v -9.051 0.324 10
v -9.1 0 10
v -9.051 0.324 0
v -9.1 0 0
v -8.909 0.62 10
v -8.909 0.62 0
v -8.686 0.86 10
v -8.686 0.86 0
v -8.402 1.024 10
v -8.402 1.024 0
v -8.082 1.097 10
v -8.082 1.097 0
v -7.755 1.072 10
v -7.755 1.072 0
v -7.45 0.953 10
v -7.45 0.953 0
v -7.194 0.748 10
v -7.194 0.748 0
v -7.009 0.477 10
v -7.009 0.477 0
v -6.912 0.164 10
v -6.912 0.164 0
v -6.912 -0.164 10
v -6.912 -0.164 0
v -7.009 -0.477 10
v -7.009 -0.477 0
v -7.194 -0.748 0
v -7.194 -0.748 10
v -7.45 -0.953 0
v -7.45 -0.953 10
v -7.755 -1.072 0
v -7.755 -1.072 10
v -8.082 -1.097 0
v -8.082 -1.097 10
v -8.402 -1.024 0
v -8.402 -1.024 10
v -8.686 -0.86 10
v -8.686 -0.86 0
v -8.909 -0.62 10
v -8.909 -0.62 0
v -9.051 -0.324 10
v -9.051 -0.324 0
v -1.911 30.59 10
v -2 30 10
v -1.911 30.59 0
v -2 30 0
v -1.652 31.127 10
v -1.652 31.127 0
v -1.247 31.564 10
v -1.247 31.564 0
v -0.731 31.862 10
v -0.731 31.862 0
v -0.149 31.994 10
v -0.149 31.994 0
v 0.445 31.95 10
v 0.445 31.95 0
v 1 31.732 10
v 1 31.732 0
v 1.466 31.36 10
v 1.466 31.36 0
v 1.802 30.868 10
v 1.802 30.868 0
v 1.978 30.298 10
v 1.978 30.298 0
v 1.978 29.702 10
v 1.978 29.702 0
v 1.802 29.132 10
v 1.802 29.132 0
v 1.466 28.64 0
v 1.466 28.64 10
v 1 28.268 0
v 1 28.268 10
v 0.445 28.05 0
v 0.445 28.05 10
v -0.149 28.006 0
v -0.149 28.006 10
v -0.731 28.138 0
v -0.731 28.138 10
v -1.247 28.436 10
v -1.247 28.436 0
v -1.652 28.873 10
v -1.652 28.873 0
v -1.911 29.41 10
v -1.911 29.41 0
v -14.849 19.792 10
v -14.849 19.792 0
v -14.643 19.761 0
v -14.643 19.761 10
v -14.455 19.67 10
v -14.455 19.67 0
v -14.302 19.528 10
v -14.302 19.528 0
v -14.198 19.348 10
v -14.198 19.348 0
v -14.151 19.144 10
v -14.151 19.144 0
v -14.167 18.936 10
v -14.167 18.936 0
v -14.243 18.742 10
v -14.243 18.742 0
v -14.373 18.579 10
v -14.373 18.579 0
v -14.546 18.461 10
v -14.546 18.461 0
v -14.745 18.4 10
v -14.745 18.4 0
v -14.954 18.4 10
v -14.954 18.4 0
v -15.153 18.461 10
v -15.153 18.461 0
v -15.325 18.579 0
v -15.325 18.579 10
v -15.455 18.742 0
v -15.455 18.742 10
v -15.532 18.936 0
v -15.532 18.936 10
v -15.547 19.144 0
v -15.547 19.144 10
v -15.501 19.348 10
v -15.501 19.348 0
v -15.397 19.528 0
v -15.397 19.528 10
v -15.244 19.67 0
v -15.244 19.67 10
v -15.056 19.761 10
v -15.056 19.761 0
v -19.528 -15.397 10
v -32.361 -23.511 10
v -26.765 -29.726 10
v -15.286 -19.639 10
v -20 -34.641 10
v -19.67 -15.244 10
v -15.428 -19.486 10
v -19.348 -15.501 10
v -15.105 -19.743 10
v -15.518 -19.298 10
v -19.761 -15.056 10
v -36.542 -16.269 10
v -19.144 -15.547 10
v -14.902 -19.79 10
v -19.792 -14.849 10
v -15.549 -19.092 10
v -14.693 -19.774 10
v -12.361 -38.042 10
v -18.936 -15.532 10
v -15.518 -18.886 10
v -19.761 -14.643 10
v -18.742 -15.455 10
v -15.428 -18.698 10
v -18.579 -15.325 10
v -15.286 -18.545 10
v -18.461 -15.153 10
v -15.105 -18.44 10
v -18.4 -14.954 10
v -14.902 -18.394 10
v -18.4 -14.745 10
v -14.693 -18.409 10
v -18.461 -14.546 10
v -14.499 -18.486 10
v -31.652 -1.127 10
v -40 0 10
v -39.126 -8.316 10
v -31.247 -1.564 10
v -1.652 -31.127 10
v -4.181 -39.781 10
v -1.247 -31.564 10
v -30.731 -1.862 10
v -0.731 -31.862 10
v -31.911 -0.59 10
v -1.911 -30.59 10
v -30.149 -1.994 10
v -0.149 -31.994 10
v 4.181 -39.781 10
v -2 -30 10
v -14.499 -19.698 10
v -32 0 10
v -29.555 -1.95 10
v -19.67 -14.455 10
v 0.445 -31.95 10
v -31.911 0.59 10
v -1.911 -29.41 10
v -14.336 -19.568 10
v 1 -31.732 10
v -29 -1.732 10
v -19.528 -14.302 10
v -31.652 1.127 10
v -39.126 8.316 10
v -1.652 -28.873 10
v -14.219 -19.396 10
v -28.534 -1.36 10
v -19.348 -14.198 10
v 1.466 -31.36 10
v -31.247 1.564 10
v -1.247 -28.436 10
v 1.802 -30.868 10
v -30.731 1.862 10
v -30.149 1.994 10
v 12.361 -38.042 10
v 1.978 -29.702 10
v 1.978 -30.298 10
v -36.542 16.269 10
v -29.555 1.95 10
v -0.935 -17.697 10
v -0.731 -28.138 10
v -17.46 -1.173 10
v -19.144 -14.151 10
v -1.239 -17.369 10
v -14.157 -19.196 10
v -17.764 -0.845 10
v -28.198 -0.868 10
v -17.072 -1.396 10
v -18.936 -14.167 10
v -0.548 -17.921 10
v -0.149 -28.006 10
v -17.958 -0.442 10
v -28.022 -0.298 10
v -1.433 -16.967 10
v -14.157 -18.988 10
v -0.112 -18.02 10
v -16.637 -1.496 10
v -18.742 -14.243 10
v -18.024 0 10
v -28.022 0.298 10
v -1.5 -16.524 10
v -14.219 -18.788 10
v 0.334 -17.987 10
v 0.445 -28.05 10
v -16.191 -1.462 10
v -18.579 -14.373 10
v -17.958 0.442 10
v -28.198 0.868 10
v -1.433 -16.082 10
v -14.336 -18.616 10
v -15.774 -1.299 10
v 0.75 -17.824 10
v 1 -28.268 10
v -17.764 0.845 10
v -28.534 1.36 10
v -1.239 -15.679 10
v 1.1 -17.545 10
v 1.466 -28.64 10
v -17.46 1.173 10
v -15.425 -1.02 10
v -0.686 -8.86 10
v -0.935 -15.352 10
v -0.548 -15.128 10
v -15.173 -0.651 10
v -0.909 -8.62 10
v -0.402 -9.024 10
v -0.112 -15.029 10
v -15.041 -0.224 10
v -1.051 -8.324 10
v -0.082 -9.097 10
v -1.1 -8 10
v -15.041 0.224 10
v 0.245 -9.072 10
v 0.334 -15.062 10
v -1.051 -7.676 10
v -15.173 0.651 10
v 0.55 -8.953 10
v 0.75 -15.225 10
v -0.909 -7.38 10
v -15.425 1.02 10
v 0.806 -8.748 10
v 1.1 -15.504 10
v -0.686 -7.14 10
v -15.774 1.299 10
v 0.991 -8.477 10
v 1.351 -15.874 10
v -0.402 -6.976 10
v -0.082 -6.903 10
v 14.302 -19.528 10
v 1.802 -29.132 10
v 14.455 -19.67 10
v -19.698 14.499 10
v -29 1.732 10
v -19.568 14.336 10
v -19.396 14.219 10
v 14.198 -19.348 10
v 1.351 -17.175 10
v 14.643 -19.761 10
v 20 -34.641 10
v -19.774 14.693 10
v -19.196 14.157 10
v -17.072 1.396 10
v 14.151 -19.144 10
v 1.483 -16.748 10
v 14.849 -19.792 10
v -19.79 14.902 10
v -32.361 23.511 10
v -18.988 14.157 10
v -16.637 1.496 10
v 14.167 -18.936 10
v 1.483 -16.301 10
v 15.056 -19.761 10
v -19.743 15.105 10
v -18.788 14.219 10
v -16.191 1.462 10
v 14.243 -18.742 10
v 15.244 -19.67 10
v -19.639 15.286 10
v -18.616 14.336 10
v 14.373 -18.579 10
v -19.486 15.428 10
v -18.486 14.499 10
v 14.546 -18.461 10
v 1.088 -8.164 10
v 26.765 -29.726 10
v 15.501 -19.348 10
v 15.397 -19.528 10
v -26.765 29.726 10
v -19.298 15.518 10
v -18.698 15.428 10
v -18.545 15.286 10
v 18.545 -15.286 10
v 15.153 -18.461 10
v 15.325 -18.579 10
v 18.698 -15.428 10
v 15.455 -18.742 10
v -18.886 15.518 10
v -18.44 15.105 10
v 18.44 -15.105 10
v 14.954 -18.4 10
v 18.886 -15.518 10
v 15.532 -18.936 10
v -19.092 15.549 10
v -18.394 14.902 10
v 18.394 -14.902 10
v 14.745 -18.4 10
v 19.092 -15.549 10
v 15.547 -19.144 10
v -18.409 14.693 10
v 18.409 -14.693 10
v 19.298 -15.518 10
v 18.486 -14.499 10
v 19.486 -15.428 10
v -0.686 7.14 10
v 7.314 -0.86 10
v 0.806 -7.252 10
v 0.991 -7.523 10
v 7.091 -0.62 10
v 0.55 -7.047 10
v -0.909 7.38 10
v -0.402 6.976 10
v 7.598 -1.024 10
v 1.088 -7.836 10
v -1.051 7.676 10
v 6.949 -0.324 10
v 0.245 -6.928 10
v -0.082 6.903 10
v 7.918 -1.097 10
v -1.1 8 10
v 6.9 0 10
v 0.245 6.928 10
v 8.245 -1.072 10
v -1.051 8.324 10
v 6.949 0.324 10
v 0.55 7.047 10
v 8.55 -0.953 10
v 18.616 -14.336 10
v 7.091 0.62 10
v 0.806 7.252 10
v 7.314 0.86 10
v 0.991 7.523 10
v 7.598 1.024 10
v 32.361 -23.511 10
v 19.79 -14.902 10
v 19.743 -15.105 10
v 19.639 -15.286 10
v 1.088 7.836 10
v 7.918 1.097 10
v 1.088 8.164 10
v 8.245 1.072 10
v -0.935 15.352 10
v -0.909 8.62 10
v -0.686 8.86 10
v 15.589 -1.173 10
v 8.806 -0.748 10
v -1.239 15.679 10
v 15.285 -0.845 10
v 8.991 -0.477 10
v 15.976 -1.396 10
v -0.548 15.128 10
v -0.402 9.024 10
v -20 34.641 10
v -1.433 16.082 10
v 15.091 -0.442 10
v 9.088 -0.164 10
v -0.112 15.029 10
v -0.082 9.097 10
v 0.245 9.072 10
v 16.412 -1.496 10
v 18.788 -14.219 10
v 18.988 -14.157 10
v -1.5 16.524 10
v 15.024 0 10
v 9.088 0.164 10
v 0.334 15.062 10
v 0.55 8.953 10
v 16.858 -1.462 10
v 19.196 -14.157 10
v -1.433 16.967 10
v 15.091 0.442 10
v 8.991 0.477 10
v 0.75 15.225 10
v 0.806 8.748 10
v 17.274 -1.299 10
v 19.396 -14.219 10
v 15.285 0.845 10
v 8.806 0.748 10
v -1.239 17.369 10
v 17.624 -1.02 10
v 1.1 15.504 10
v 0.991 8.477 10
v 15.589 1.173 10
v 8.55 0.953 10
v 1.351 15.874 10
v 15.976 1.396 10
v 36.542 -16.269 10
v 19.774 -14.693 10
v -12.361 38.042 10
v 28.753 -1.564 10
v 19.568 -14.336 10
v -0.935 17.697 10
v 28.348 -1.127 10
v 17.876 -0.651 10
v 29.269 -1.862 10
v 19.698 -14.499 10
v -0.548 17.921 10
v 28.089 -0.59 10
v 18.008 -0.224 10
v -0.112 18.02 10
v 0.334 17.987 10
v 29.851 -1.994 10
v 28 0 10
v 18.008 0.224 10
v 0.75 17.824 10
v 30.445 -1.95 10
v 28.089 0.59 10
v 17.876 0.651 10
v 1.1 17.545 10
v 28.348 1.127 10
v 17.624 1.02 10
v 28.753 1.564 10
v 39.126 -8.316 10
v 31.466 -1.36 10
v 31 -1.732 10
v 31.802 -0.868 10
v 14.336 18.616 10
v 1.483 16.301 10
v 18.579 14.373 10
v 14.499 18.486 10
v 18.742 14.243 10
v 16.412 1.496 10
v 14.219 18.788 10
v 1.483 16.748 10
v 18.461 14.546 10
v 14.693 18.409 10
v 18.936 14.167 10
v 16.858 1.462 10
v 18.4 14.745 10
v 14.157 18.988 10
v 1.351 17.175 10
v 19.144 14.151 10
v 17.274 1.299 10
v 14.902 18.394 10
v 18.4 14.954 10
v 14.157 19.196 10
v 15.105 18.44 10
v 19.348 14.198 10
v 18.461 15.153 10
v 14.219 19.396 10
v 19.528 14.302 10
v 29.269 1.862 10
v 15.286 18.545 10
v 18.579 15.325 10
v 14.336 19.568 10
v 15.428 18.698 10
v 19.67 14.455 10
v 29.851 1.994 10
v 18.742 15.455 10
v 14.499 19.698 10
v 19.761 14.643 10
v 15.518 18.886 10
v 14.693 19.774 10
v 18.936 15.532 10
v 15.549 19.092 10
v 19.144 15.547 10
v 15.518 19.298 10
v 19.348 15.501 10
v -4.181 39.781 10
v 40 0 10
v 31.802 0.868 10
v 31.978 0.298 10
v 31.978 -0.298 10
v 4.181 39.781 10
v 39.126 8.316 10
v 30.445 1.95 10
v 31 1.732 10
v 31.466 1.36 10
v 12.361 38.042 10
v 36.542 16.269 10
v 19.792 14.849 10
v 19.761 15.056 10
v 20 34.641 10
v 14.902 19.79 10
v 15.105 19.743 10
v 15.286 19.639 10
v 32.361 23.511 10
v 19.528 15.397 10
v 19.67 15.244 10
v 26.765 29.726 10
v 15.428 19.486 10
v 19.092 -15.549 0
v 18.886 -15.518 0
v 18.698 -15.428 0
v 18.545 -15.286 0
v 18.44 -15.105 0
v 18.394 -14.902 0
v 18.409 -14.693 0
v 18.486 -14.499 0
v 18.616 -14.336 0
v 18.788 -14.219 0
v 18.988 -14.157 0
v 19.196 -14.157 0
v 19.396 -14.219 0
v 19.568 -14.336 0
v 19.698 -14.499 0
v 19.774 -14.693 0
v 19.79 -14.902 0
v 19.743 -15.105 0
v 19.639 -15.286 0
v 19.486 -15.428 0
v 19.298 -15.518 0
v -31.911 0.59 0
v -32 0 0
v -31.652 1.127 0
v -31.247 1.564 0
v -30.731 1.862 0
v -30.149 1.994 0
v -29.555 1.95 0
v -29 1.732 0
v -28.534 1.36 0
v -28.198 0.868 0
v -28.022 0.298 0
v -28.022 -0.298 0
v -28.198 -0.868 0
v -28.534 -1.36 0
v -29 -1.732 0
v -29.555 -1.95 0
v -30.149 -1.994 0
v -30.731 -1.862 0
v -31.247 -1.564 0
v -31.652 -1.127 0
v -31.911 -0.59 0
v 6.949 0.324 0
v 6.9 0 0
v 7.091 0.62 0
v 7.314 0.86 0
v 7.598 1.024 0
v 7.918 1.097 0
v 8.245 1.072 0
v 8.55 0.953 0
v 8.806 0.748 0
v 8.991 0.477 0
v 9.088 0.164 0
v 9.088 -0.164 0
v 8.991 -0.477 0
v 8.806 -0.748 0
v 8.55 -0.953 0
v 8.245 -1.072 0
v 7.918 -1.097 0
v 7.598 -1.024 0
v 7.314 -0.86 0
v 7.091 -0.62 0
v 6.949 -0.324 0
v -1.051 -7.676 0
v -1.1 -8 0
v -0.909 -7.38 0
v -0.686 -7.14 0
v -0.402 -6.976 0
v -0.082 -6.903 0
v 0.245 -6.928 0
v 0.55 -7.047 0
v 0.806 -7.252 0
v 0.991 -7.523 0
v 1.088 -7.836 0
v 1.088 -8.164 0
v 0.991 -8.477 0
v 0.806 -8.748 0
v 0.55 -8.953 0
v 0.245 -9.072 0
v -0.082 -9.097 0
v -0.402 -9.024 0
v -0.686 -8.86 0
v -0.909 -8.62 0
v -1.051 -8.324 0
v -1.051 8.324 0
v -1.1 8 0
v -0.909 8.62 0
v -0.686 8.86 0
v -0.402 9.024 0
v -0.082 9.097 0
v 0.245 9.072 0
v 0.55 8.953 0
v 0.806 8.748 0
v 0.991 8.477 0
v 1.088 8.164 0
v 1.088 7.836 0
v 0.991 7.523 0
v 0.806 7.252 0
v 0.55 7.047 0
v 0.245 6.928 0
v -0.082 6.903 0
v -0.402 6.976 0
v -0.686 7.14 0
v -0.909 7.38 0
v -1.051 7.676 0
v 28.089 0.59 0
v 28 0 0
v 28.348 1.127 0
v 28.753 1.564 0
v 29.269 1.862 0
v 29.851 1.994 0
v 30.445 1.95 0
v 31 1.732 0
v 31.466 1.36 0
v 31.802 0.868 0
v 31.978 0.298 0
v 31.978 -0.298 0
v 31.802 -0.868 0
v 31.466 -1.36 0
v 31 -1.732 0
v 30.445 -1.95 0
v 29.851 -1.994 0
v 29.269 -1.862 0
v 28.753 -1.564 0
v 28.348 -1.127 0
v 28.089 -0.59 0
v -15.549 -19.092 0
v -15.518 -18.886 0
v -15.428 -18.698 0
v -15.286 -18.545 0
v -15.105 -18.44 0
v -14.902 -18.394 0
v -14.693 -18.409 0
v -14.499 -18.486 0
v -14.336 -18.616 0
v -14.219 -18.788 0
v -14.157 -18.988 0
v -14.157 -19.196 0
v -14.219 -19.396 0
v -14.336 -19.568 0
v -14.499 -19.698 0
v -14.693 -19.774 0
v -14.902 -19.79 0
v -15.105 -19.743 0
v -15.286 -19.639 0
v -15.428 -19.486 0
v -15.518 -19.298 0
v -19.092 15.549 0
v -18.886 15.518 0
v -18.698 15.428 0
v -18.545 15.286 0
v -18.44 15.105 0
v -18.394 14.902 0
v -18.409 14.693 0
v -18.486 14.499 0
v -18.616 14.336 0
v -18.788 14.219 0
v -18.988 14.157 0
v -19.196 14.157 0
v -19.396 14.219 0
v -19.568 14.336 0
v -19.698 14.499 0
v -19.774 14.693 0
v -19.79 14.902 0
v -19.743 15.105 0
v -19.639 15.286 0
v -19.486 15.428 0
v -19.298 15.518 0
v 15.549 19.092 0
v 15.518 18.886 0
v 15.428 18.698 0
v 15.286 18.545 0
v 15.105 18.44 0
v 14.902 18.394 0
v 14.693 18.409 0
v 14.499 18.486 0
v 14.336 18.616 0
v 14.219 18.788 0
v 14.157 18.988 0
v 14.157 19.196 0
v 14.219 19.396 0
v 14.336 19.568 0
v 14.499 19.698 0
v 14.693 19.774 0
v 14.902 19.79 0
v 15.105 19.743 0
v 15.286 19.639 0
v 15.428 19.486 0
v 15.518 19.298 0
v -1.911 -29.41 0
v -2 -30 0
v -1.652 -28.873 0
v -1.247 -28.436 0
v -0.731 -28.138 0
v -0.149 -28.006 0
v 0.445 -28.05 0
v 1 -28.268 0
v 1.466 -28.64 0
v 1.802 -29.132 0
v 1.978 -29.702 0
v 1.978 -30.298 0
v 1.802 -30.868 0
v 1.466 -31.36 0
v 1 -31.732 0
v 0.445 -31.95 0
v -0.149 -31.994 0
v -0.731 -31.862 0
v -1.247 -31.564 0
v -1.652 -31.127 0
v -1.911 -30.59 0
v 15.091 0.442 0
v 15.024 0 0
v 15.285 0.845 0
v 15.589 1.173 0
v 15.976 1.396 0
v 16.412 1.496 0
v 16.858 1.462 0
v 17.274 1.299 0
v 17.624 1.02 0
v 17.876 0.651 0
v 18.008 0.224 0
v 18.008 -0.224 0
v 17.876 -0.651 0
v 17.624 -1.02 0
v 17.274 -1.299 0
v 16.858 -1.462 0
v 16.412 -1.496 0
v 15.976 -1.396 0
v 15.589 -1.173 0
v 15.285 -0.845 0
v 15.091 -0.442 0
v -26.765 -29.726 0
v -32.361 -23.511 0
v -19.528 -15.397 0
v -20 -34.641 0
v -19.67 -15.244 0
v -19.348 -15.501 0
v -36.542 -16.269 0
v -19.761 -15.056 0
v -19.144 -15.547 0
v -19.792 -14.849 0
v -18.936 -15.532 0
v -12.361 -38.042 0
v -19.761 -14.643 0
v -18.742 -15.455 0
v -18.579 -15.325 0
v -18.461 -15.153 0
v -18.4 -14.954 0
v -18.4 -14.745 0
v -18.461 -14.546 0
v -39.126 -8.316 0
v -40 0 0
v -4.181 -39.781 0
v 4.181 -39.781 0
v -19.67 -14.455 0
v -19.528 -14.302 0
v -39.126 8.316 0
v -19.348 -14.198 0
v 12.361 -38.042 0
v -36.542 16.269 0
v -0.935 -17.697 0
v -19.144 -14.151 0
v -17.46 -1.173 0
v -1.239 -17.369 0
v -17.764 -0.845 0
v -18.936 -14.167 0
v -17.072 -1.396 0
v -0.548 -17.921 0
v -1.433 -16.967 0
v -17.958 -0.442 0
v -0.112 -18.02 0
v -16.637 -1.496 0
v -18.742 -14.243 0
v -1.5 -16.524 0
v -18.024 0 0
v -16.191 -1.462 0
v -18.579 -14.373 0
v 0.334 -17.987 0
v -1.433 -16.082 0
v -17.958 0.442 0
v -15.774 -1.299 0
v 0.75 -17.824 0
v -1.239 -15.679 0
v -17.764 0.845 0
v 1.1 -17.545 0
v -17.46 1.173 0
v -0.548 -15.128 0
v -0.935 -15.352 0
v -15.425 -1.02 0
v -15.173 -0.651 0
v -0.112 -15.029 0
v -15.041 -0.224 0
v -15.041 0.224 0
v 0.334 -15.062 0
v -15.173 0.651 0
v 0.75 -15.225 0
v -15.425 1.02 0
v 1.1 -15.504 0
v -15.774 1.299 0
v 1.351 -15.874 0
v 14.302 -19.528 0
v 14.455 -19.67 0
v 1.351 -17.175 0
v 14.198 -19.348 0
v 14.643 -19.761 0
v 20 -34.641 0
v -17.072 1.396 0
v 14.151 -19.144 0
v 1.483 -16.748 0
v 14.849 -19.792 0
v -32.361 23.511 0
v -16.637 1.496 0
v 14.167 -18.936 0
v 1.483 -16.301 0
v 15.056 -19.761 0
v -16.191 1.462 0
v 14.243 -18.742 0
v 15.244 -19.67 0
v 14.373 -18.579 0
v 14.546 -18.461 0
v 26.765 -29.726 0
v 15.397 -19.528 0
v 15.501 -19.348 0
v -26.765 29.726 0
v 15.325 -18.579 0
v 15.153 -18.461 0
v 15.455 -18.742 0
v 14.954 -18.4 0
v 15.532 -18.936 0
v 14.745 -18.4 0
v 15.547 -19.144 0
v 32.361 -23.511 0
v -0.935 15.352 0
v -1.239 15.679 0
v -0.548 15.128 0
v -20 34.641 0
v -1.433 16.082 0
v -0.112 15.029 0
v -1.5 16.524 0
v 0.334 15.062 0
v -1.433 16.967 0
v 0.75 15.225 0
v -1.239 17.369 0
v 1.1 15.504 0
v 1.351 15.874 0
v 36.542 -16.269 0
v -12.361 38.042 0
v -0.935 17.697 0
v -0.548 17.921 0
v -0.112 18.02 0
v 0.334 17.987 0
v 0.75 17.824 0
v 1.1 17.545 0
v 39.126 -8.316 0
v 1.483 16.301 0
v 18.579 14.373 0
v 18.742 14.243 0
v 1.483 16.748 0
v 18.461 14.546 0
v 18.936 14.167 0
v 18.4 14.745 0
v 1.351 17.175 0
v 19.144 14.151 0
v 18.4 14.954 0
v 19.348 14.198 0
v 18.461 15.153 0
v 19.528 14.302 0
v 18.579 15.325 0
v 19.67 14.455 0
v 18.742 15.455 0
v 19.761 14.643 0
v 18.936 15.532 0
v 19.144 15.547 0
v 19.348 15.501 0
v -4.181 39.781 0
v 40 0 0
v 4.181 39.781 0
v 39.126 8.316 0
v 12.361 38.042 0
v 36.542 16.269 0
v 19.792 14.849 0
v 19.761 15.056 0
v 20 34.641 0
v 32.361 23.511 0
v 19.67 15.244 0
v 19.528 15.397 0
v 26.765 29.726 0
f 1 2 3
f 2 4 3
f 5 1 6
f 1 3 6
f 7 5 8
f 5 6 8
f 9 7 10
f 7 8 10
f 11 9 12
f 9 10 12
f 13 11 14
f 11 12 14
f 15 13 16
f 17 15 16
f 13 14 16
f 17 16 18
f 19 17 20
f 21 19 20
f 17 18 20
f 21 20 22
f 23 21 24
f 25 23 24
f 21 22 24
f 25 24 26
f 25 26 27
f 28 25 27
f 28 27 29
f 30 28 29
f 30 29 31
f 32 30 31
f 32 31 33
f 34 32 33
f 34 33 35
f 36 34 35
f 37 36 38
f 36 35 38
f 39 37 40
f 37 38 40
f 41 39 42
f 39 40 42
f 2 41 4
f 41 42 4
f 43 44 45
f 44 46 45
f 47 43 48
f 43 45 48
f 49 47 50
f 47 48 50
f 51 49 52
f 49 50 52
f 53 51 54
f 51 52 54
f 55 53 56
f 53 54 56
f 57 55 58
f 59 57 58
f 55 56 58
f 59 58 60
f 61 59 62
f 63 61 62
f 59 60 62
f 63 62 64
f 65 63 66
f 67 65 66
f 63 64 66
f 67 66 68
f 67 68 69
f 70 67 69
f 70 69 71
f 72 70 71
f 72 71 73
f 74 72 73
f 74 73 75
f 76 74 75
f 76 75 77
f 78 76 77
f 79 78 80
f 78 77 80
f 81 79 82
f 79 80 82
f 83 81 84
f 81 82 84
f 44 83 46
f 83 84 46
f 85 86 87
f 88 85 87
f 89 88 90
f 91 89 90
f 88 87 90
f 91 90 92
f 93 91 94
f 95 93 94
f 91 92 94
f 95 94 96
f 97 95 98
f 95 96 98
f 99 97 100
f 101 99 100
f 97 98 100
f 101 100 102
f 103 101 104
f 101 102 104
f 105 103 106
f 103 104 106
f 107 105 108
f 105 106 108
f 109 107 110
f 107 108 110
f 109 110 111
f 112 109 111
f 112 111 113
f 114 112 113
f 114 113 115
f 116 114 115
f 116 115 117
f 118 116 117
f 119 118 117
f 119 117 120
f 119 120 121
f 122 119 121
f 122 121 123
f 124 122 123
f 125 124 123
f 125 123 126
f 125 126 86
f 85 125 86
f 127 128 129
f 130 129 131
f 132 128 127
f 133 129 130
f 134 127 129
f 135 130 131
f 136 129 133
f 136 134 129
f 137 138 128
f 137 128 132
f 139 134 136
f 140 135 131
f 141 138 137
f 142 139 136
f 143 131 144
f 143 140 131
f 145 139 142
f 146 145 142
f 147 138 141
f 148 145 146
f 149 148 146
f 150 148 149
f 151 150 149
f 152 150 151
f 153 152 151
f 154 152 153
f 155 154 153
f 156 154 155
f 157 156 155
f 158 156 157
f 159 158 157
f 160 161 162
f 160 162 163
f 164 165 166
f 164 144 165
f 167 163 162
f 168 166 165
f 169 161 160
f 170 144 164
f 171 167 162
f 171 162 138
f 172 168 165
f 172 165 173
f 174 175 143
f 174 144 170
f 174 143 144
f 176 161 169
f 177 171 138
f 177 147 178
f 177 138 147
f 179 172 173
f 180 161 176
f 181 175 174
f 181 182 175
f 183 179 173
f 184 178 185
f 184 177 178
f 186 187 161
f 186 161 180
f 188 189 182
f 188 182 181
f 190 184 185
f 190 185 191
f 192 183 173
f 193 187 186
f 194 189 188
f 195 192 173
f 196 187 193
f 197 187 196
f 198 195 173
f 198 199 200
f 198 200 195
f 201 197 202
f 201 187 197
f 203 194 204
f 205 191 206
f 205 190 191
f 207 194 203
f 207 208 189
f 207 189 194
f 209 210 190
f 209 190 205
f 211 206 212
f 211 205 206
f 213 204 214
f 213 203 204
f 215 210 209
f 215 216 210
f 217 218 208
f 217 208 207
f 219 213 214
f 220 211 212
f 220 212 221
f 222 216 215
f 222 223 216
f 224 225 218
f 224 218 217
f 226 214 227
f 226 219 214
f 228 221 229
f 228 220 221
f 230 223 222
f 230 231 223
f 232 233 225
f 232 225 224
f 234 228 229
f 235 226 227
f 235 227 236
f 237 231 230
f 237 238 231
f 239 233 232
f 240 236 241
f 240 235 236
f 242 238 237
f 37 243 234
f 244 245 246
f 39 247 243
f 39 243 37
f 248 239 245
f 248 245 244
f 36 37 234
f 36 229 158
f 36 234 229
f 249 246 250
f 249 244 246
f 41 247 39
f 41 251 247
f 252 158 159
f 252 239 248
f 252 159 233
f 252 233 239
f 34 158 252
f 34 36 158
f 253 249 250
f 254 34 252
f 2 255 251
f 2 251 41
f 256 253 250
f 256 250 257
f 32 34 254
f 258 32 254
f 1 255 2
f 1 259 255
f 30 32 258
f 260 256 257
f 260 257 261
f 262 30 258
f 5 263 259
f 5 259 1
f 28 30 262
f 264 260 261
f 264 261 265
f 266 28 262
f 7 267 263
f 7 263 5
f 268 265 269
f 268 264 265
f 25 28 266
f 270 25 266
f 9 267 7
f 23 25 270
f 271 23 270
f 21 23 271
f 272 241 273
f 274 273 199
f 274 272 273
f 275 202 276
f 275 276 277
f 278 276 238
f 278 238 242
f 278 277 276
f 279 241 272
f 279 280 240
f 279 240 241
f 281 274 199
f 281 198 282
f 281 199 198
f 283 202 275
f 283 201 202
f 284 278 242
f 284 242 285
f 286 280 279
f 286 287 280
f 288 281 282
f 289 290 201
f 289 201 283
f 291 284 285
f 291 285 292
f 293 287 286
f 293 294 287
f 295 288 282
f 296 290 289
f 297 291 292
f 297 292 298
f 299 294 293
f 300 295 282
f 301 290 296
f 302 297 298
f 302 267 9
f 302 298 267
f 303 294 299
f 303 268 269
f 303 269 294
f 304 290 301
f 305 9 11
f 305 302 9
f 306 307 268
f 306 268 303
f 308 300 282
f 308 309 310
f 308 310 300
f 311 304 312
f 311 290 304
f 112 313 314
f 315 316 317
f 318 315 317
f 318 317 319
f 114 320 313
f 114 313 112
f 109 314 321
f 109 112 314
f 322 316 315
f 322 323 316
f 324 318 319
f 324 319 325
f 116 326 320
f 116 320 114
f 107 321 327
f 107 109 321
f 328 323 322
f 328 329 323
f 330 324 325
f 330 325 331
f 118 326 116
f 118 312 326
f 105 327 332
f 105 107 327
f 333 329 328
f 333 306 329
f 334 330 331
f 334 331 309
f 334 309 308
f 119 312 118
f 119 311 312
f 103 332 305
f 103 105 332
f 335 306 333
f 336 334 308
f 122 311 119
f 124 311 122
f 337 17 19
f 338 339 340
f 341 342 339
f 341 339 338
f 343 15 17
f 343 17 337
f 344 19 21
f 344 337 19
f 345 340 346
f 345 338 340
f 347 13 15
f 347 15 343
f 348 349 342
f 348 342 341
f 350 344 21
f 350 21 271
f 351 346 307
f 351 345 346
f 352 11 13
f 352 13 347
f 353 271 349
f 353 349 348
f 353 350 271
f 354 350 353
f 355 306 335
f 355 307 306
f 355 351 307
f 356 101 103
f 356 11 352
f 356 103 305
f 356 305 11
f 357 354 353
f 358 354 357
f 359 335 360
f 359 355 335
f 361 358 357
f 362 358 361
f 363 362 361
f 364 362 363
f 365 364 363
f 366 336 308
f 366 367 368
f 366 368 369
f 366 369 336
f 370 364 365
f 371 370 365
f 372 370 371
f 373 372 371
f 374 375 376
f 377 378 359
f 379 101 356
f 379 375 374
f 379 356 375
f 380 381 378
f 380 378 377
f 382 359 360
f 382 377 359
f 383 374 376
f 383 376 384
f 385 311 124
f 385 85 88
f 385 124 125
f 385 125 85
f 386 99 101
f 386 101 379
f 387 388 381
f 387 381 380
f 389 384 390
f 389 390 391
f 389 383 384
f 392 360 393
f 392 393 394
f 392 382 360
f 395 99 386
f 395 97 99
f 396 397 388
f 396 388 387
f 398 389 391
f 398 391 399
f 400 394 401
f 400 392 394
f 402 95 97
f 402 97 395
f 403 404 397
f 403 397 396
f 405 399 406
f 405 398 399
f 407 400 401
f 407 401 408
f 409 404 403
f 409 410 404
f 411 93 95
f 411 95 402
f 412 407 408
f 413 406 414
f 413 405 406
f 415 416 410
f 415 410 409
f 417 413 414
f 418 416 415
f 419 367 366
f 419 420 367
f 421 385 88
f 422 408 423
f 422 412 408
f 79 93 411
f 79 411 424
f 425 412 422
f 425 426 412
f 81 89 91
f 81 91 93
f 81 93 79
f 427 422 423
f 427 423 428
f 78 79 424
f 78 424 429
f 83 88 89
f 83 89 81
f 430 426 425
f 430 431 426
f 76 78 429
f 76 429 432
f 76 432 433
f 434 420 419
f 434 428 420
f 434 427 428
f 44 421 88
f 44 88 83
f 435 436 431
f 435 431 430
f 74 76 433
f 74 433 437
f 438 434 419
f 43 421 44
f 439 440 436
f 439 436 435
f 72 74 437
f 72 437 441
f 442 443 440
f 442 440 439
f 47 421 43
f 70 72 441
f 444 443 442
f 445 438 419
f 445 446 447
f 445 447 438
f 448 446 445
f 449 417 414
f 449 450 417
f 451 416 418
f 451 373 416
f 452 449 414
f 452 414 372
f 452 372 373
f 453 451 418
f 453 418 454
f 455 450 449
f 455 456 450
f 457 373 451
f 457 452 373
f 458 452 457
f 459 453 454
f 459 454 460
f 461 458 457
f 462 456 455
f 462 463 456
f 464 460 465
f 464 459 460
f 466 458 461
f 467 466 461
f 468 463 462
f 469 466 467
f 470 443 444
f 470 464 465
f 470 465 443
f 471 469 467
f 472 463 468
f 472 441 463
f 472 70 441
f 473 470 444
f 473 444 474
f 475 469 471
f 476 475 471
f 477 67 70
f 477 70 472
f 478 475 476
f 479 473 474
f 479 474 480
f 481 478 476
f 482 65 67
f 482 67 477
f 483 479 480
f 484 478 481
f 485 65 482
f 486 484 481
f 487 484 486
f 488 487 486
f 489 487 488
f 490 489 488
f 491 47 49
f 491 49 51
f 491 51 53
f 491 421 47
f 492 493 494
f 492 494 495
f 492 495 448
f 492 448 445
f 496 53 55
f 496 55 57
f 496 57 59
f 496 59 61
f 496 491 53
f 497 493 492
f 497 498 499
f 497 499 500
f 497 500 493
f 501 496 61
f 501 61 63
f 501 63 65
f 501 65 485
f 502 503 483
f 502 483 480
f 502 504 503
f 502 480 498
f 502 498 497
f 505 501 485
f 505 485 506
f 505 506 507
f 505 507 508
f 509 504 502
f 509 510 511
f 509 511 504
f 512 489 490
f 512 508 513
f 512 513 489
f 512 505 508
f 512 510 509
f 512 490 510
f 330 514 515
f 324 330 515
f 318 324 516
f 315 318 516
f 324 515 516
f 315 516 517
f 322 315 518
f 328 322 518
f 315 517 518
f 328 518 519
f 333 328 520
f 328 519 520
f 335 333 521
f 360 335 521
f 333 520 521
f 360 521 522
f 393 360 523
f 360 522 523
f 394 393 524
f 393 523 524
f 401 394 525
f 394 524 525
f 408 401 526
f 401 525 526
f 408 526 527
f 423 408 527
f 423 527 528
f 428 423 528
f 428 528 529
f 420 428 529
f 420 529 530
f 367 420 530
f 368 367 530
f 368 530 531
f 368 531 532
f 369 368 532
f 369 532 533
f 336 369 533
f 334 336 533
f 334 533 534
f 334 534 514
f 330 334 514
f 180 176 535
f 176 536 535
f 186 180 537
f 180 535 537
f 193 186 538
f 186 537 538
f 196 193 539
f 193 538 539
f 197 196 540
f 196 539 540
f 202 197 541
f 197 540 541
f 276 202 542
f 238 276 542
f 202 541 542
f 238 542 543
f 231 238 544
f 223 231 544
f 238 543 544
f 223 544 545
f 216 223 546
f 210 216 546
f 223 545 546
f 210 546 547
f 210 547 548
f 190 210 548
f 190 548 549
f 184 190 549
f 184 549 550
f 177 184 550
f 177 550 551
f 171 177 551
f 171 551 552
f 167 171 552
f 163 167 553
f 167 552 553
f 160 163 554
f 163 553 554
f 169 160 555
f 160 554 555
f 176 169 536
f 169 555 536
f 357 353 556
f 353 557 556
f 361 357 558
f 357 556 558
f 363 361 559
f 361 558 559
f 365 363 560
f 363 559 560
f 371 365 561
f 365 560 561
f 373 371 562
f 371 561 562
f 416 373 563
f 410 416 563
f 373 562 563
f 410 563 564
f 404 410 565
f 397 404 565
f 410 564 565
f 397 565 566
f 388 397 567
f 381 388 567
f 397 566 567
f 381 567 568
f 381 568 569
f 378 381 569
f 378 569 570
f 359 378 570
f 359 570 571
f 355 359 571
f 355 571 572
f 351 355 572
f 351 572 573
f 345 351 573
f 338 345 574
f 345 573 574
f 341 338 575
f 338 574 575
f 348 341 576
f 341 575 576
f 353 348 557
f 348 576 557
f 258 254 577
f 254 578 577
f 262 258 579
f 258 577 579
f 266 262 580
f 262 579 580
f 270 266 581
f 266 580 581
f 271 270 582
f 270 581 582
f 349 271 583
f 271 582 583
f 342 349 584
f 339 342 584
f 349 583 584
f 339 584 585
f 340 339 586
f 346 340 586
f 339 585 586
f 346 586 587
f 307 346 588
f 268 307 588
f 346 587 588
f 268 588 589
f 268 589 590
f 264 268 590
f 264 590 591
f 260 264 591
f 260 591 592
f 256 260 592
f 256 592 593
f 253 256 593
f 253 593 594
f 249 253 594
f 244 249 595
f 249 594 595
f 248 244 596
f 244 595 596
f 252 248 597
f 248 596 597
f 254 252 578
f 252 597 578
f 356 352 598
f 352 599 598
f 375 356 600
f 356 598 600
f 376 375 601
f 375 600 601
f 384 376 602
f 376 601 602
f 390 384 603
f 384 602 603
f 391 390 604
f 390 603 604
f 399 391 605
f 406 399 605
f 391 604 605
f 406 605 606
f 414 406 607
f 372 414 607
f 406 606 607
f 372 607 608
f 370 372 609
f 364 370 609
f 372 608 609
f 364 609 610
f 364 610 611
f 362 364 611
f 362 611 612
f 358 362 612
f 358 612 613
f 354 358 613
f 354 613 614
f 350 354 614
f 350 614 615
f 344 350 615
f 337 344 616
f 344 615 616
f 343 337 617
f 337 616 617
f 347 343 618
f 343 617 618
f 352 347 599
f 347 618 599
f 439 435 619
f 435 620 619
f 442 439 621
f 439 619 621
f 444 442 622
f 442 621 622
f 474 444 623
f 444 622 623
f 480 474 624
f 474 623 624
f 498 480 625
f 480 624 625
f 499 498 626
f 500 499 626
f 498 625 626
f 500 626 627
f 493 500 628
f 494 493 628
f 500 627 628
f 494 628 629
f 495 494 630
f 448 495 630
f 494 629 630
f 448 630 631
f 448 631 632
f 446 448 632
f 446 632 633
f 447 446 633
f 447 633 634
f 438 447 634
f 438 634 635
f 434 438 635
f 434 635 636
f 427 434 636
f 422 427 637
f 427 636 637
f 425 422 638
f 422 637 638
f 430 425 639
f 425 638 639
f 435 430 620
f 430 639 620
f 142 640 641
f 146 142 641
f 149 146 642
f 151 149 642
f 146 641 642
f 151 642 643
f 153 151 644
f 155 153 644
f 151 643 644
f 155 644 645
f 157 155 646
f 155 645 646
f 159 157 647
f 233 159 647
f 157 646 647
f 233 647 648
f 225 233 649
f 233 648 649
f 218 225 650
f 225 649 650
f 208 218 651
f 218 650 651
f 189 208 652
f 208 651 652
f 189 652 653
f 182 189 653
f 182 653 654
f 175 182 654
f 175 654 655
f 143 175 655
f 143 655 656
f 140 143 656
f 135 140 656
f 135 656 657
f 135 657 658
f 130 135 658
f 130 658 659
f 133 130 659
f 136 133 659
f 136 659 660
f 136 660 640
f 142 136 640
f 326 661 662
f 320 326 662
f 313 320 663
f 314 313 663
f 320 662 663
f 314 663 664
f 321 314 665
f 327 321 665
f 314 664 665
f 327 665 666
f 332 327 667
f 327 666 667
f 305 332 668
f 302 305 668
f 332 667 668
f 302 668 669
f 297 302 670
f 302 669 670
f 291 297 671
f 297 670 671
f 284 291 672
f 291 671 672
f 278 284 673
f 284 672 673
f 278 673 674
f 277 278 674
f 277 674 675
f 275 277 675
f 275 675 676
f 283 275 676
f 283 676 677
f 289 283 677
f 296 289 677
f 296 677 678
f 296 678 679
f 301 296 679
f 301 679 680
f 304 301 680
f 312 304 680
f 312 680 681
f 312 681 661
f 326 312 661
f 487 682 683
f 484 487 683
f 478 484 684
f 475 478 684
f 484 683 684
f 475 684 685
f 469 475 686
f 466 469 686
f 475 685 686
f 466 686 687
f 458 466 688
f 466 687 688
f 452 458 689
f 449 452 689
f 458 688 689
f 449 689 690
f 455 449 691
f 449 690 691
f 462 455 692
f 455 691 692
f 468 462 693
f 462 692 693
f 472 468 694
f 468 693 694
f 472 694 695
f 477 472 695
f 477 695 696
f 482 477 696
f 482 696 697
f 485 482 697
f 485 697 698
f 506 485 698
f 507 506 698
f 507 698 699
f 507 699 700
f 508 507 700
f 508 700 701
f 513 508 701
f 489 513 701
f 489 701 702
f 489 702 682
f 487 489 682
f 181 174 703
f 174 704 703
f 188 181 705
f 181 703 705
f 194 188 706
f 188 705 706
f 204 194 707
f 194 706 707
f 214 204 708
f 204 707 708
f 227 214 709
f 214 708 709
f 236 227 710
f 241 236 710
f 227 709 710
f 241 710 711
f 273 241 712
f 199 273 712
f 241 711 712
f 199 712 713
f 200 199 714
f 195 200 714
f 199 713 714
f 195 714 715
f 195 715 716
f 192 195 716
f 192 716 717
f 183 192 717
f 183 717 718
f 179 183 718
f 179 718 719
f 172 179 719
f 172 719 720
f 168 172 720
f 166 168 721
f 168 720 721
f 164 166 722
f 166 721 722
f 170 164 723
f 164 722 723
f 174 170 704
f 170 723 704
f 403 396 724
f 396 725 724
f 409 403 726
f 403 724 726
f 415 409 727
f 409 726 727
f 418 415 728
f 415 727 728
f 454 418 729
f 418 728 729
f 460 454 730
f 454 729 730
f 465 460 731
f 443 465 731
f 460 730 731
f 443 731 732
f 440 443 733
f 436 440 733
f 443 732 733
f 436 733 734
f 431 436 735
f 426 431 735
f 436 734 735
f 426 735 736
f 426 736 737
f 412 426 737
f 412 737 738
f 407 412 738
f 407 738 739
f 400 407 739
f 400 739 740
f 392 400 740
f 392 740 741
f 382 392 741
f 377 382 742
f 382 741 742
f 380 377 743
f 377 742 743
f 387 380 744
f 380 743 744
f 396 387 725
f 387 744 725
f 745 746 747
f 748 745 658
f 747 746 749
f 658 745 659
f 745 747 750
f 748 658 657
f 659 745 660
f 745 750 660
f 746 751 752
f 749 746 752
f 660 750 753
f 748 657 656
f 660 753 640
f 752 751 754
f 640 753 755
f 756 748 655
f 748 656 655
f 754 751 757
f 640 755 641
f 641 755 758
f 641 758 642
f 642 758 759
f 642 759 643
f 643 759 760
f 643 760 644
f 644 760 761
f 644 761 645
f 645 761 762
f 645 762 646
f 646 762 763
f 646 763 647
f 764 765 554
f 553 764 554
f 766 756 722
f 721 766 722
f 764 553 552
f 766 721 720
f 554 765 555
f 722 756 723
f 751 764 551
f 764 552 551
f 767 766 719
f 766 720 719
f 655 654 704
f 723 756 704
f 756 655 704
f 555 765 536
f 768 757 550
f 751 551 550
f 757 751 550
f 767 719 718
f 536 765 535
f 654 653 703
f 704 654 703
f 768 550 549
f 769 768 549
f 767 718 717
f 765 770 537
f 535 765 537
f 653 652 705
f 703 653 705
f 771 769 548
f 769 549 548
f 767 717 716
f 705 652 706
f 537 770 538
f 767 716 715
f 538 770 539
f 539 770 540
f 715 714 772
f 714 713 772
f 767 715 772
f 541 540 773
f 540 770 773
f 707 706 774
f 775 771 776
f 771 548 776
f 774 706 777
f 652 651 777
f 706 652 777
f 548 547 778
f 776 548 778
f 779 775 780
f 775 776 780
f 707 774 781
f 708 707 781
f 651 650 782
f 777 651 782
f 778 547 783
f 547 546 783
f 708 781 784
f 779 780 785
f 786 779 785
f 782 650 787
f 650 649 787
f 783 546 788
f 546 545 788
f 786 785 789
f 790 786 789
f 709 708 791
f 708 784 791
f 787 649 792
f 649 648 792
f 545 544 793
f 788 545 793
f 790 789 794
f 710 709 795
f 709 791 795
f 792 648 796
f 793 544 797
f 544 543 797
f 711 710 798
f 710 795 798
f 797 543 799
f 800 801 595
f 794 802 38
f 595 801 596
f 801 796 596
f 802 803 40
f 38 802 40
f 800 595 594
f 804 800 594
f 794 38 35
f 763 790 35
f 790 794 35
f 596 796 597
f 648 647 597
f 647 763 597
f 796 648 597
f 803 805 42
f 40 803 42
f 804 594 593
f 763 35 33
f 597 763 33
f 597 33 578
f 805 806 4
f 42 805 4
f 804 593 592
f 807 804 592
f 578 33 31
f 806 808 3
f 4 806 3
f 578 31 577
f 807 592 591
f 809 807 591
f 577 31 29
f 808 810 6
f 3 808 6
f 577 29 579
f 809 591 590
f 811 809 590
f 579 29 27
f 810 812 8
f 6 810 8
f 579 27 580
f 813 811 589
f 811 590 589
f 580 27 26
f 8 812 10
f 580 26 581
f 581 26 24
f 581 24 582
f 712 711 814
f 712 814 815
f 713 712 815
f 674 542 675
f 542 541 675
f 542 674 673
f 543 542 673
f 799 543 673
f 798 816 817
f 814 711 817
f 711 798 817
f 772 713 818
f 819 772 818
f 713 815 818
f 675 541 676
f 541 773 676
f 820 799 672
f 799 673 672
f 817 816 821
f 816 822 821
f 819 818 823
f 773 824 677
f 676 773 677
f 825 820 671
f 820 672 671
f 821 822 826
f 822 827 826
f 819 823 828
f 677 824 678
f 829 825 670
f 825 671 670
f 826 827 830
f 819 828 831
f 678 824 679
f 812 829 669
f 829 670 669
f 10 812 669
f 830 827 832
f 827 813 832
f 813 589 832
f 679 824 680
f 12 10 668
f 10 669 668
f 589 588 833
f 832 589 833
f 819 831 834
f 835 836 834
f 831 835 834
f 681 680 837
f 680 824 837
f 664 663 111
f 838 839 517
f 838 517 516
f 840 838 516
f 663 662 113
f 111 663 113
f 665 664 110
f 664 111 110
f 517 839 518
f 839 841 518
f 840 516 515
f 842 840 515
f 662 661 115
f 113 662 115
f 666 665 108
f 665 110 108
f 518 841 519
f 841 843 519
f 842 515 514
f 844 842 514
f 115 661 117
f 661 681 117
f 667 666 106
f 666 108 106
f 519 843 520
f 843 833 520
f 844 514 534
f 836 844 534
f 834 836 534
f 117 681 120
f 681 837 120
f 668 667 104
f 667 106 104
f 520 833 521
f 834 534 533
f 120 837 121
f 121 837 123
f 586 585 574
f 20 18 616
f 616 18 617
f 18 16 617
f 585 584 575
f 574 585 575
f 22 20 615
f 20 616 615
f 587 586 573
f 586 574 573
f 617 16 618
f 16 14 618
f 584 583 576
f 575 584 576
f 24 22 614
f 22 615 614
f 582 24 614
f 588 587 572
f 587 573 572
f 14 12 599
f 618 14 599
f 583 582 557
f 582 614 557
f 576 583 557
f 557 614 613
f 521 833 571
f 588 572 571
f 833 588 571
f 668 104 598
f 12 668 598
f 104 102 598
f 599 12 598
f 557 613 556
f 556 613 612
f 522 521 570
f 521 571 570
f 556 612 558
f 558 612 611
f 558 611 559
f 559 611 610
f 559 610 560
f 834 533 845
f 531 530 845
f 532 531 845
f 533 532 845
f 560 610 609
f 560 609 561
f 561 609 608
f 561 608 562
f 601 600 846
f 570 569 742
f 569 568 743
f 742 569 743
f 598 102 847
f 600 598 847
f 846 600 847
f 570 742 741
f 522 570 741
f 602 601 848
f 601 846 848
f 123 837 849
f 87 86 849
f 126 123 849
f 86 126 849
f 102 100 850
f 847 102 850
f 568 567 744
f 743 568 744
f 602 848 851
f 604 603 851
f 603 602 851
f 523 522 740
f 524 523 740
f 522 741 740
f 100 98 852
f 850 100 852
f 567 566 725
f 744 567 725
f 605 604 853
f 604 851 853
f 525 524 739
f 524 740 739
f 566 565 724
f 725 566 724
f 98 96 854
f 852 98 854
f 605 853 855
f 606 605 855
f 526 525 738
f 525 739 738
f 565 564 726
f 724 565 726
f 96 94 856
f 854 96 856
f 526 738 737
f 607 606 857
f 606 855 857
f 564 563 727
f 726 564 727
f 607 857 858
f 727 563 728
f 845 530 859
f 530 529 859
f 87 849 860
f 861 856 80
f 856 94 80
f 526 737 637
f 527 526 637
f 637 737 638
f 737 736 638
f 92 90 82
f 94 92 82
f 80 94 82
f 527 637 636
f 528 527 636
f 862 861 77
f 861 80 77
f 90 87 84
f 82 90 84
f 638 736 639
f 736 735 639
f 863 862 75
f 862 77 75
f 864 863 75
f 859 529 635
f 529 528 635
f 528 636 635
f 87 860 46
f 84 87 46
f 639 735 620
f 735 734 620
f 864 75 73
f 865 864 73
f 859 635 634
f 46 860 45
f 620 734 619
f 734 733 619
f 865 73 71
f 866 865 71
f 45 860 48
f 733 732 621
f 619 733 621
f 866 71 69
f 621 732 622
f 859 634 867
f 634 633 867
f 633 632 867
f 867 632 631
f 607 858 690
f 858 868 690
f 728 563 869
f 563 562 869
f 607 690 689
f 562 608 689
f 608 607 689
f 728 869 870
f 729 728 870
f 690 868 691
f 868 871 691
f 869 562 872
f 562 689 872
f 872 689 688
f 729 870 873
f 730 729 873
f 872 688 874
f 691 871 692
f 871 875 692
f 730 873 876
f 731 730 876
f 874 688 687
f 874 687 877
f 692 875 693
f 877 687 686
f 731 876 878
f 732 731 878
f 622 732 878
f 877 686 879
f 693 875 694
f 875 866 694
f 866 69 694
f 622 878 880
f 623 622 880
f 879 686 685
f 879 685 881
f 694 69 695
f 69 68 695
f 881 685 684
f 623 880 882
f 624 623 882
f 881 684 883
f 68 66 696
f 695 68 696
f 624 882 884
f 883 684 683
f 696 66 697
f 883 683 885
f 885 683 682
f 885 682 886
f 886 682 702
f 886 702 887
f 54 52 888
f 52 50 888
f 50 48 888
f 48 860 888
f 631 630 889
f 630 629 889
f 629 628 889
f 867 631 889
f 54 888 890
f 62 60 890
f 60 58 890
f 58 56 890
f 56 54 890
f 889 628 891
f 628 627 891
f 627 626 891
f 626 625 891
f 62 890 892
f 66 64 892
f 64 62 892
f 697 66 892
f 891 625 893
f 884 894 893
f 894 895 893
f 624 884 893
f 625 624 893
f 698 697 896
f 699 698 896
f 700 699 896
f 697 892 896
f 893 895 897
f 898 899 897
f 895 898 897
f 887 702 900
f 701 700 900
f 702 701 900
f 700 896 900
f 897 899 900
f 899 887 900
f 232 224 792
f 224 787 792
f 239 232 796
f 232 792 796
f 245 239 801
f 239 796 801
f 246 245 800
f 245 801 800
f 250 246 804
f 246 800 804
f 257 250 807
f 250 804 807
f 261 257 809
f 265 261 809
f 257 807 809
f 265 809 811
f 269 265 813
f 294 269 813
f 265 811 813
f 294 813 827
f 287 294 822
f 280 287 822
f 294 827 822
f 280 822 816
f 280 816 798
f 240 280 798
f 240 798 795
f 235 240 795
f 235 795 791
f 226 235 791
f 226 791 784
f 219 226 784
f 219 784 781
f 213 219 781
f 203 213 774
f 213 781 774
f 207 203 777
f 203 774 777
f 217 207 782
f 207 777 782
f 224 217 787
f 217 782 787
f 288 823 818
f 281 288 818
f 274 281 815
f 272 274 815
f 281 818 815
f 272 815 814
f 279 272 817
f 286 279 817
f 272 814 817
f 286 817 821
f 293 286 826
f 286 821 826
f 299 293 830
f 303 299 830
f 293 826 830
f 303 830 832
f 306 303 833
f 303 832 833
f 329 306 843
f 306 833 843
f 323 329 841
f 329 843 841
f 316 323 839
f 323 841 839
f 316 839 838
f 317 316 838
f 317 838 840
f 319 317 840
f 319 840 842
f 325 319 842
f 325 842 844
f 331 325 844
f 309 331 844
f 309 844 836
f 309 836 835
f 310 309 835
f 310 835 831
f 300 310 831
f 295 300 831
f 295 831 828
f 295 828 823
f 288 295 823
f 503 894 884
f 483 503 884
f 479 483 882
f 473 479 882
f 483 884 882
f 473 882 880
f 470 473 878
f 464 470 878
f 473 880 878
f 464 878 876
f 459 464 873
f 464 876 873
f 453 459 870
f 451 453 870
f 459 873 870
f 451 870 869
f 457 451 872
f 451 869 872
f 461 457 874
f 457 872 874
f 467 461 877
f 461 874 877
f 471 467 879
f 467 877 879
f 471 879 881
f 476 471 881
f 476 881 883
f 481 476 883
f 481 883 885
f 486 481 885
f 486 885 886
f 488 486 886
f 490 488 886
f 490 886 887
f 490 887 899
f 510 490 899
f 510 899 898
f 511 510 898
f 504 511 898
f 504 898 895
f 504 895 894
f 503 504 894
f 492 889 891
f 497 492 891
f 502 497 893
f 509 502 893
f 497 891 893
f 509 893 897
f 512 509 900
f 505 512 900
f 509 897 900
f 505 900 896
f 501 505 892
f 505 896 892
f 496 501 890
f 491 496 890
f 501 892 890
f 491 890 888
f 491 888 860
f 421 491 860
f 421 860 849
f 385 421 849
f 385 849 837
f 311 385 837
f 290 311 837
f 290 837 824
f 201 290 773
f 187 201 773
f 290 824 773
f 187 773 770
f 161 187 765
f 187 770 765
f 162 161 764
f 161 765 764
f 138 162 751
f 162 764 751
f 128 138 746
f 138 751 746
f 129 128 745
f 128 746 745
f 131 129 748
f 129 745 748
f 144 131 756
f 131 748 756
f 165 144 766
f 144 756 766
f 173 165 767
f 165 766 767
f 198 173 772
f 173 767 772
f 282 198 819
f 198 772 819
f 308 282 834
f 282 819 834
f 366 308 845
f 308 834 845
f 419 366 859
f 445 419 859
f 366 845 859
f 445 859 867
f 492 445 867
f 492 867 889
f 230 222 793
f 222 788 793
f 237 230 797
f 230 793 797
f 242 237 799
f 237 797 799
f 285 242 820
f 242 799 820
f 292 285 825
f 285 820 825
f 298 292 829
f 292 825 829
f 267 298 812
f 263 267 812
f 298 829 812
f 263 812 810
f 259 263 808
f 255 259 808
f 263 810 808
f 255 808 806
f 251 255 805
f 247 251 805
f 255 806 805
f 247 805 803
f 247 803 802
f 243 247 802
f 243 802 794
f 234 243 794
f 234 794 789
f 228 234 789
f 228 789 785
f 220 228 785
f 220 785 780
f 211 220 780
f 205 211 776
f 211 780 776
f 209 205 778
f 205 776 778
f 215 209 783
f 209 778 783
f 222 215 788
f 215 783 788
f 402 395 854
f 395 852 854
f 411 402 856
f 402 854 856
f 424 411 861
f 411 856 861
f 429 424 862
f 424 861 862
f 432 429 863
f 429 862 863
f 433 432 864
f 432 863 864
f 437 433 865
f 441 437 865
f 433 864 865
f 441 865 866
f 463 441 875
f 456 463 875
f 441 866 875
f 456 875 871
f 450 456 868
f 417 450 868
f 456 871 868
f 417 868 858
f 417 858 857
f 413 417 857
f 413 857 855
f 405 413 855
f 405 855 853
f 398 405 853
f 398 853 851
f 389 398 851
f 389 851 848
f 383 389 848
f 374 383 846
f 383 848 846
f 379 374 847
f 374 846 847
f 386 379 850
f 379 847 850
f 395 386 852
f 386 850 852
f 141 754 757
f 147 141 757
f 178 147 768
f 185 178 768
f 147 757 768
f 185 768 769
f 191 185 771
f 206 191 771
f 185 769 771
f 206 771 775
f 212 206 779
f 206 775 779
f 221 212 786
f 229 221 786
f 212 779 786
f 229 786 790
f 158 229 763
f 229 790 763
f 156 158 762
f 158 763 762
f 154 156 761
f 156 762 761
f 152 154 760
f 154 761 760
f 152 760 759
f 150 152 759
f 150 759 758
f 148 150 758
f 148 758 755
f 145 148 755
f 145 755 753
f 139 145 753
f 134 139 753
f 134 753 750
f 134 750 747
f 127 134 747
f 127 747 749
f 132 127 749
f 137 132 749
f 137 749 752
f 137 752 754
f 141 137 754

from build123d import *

# Parameters (mm, degrees)
SKETCH1_R                      = 40
BOSS_EXTRUDE1_DEPTH            = 10
F_4_0_4_DIAMETER_HOLE1_D       = 4
F_4_0_4_DIAMETER_HOLE1_DEPTH   = 10
F_4_0_4_DIAMETER_HOLE1_TIP     = 1.201721238
F_2_2_2_2_DIAMETER_HOLE1_D     = 2.2
F_2_2_2_2_DIAMETER_HOLE1_DEPTH = 10
F_2_2_2_2_DIAMETER_HOLE1_TIP   = 0.660946681
F_3_0_3_DIAMETER_HOLE4_D       = 3
F_3_0_3_DIAMETER_HOLE4_DEPTH   = 10
F_3_0_3_DIAMETER_HOLE4_TIP     = 0.901290929
F_1_4_1_4_DIAMETER_HOLE1_D     = 1.4
CIRPATTERN1_COUNT              = 4


with BuildPart() as part:
    # Sketch1 → Boss-Extrude1 (new body)
    with BuildSketch(Plane.XY):
        Circle(SKETCH1_R)
    extrude(amount=BOSS_EXTRUDE1_DEPTH)

    # Ø4.0 (4) Diameter Hole1
    with Locations(Plane.XY.offset(10)):
        with Locations((0, 30), (30, 0), (-30, 0), (0, -30)):
            Hole(F_4_0_4_DIAMETER_HOLE1_D / 2, depth=F_4_0_4_DIAMETER_HOLE1_DEPTH)
            with Locations((0, 0, -(F_4_0_4_DIAMETER_HOLE1_DEPTH + F_4_0_4_DIAMETER_HOLE1_TIP / 2))):  # 118° drill point
                Cone(0, F_4_0_4_DIAMETER_HOLE1_D / 2, F_4_0_4_DIAMETER_HOLE1_TIP, mode=Mode.SUBTRACT)

    # Ø2.2 (2.2) Diameter Hole1
    with Locations(Plane.XY.offset(10)):
        with Locations((0, 8), (0, -8), (-8, 0), (8, 0)):
            Hole(F_2_2_2_2_DIAMETER_HOLE1_D / 2, depth=F_2_2_2_2_DIAMETER_HOLE1_DEPTH)
            with Locations((0, 0, -(F_2_2_2_2_DIAMETER_HOLE1_DEPTH + F_2_2_2_2_DIAMETER_HOLE1_TIP / 2))):  # 118° drill point
                Cone(0, F_2_2_2_2_DIAMETER_HOLE1_D / 2, F_2_2_2_2_DIAMETER_HOLE1_TIP, mode=Mode.SUBTRACT)

    # Ø3.0 (3) Diameter Hole4
    with Locations(Plane.XY.offset(10)):
        with Locations((0, -16.52447999), (16.52447999, 0), (0, 16.52447999), (-16.52447999, 0)):
            Hole(F_3_0_3_DIAMETER_HOLE4_D / 2, depth=F_3_0_3_DIAMETER_HOLE4_DEPTH)
            with Locations((0, 0, -(F_3_0_3_DIAMETER_HOLE4_DEPTH + F_3_0_3_DIAMETER_HOLE4_TIP / 2))):  # 118° drill point
                Cone(0, F_3_0_3_DIAMETER_HOLE4_D / 2, F_3_0_3_DIAMETER_HOLE4_TIP, mode=Mode.SUBTRACT)

    # Ø1.4 (1.4) Diameter Hole1 (through all)
    with Locations(Plane.XY.offset(10)):
        with Locations((-14.849242405, -19.091883092), (-19.091883092, -14.849242405)):
            f_1_4_1_4_diameter_hole1 = Hole(F_1_4_1_4_DIAMETER_HOLE1_D / 2)

    # CirPattern1: Ø1.4 (1.4) Diameter Hole1 ×4 about axis
    cirpattern1_axis = Axis((0, 0, 0), (0, 0, 1))
    for i in range(1, CIRPATTERN1_COUNT):
        add(f_1_4_1_4_diameter_hole1.rotate(cirpattern1_axis, i * 360 / CIRPATTERN1_COUNT), mode=Mode.SUBTRACT)


solid = part.part
